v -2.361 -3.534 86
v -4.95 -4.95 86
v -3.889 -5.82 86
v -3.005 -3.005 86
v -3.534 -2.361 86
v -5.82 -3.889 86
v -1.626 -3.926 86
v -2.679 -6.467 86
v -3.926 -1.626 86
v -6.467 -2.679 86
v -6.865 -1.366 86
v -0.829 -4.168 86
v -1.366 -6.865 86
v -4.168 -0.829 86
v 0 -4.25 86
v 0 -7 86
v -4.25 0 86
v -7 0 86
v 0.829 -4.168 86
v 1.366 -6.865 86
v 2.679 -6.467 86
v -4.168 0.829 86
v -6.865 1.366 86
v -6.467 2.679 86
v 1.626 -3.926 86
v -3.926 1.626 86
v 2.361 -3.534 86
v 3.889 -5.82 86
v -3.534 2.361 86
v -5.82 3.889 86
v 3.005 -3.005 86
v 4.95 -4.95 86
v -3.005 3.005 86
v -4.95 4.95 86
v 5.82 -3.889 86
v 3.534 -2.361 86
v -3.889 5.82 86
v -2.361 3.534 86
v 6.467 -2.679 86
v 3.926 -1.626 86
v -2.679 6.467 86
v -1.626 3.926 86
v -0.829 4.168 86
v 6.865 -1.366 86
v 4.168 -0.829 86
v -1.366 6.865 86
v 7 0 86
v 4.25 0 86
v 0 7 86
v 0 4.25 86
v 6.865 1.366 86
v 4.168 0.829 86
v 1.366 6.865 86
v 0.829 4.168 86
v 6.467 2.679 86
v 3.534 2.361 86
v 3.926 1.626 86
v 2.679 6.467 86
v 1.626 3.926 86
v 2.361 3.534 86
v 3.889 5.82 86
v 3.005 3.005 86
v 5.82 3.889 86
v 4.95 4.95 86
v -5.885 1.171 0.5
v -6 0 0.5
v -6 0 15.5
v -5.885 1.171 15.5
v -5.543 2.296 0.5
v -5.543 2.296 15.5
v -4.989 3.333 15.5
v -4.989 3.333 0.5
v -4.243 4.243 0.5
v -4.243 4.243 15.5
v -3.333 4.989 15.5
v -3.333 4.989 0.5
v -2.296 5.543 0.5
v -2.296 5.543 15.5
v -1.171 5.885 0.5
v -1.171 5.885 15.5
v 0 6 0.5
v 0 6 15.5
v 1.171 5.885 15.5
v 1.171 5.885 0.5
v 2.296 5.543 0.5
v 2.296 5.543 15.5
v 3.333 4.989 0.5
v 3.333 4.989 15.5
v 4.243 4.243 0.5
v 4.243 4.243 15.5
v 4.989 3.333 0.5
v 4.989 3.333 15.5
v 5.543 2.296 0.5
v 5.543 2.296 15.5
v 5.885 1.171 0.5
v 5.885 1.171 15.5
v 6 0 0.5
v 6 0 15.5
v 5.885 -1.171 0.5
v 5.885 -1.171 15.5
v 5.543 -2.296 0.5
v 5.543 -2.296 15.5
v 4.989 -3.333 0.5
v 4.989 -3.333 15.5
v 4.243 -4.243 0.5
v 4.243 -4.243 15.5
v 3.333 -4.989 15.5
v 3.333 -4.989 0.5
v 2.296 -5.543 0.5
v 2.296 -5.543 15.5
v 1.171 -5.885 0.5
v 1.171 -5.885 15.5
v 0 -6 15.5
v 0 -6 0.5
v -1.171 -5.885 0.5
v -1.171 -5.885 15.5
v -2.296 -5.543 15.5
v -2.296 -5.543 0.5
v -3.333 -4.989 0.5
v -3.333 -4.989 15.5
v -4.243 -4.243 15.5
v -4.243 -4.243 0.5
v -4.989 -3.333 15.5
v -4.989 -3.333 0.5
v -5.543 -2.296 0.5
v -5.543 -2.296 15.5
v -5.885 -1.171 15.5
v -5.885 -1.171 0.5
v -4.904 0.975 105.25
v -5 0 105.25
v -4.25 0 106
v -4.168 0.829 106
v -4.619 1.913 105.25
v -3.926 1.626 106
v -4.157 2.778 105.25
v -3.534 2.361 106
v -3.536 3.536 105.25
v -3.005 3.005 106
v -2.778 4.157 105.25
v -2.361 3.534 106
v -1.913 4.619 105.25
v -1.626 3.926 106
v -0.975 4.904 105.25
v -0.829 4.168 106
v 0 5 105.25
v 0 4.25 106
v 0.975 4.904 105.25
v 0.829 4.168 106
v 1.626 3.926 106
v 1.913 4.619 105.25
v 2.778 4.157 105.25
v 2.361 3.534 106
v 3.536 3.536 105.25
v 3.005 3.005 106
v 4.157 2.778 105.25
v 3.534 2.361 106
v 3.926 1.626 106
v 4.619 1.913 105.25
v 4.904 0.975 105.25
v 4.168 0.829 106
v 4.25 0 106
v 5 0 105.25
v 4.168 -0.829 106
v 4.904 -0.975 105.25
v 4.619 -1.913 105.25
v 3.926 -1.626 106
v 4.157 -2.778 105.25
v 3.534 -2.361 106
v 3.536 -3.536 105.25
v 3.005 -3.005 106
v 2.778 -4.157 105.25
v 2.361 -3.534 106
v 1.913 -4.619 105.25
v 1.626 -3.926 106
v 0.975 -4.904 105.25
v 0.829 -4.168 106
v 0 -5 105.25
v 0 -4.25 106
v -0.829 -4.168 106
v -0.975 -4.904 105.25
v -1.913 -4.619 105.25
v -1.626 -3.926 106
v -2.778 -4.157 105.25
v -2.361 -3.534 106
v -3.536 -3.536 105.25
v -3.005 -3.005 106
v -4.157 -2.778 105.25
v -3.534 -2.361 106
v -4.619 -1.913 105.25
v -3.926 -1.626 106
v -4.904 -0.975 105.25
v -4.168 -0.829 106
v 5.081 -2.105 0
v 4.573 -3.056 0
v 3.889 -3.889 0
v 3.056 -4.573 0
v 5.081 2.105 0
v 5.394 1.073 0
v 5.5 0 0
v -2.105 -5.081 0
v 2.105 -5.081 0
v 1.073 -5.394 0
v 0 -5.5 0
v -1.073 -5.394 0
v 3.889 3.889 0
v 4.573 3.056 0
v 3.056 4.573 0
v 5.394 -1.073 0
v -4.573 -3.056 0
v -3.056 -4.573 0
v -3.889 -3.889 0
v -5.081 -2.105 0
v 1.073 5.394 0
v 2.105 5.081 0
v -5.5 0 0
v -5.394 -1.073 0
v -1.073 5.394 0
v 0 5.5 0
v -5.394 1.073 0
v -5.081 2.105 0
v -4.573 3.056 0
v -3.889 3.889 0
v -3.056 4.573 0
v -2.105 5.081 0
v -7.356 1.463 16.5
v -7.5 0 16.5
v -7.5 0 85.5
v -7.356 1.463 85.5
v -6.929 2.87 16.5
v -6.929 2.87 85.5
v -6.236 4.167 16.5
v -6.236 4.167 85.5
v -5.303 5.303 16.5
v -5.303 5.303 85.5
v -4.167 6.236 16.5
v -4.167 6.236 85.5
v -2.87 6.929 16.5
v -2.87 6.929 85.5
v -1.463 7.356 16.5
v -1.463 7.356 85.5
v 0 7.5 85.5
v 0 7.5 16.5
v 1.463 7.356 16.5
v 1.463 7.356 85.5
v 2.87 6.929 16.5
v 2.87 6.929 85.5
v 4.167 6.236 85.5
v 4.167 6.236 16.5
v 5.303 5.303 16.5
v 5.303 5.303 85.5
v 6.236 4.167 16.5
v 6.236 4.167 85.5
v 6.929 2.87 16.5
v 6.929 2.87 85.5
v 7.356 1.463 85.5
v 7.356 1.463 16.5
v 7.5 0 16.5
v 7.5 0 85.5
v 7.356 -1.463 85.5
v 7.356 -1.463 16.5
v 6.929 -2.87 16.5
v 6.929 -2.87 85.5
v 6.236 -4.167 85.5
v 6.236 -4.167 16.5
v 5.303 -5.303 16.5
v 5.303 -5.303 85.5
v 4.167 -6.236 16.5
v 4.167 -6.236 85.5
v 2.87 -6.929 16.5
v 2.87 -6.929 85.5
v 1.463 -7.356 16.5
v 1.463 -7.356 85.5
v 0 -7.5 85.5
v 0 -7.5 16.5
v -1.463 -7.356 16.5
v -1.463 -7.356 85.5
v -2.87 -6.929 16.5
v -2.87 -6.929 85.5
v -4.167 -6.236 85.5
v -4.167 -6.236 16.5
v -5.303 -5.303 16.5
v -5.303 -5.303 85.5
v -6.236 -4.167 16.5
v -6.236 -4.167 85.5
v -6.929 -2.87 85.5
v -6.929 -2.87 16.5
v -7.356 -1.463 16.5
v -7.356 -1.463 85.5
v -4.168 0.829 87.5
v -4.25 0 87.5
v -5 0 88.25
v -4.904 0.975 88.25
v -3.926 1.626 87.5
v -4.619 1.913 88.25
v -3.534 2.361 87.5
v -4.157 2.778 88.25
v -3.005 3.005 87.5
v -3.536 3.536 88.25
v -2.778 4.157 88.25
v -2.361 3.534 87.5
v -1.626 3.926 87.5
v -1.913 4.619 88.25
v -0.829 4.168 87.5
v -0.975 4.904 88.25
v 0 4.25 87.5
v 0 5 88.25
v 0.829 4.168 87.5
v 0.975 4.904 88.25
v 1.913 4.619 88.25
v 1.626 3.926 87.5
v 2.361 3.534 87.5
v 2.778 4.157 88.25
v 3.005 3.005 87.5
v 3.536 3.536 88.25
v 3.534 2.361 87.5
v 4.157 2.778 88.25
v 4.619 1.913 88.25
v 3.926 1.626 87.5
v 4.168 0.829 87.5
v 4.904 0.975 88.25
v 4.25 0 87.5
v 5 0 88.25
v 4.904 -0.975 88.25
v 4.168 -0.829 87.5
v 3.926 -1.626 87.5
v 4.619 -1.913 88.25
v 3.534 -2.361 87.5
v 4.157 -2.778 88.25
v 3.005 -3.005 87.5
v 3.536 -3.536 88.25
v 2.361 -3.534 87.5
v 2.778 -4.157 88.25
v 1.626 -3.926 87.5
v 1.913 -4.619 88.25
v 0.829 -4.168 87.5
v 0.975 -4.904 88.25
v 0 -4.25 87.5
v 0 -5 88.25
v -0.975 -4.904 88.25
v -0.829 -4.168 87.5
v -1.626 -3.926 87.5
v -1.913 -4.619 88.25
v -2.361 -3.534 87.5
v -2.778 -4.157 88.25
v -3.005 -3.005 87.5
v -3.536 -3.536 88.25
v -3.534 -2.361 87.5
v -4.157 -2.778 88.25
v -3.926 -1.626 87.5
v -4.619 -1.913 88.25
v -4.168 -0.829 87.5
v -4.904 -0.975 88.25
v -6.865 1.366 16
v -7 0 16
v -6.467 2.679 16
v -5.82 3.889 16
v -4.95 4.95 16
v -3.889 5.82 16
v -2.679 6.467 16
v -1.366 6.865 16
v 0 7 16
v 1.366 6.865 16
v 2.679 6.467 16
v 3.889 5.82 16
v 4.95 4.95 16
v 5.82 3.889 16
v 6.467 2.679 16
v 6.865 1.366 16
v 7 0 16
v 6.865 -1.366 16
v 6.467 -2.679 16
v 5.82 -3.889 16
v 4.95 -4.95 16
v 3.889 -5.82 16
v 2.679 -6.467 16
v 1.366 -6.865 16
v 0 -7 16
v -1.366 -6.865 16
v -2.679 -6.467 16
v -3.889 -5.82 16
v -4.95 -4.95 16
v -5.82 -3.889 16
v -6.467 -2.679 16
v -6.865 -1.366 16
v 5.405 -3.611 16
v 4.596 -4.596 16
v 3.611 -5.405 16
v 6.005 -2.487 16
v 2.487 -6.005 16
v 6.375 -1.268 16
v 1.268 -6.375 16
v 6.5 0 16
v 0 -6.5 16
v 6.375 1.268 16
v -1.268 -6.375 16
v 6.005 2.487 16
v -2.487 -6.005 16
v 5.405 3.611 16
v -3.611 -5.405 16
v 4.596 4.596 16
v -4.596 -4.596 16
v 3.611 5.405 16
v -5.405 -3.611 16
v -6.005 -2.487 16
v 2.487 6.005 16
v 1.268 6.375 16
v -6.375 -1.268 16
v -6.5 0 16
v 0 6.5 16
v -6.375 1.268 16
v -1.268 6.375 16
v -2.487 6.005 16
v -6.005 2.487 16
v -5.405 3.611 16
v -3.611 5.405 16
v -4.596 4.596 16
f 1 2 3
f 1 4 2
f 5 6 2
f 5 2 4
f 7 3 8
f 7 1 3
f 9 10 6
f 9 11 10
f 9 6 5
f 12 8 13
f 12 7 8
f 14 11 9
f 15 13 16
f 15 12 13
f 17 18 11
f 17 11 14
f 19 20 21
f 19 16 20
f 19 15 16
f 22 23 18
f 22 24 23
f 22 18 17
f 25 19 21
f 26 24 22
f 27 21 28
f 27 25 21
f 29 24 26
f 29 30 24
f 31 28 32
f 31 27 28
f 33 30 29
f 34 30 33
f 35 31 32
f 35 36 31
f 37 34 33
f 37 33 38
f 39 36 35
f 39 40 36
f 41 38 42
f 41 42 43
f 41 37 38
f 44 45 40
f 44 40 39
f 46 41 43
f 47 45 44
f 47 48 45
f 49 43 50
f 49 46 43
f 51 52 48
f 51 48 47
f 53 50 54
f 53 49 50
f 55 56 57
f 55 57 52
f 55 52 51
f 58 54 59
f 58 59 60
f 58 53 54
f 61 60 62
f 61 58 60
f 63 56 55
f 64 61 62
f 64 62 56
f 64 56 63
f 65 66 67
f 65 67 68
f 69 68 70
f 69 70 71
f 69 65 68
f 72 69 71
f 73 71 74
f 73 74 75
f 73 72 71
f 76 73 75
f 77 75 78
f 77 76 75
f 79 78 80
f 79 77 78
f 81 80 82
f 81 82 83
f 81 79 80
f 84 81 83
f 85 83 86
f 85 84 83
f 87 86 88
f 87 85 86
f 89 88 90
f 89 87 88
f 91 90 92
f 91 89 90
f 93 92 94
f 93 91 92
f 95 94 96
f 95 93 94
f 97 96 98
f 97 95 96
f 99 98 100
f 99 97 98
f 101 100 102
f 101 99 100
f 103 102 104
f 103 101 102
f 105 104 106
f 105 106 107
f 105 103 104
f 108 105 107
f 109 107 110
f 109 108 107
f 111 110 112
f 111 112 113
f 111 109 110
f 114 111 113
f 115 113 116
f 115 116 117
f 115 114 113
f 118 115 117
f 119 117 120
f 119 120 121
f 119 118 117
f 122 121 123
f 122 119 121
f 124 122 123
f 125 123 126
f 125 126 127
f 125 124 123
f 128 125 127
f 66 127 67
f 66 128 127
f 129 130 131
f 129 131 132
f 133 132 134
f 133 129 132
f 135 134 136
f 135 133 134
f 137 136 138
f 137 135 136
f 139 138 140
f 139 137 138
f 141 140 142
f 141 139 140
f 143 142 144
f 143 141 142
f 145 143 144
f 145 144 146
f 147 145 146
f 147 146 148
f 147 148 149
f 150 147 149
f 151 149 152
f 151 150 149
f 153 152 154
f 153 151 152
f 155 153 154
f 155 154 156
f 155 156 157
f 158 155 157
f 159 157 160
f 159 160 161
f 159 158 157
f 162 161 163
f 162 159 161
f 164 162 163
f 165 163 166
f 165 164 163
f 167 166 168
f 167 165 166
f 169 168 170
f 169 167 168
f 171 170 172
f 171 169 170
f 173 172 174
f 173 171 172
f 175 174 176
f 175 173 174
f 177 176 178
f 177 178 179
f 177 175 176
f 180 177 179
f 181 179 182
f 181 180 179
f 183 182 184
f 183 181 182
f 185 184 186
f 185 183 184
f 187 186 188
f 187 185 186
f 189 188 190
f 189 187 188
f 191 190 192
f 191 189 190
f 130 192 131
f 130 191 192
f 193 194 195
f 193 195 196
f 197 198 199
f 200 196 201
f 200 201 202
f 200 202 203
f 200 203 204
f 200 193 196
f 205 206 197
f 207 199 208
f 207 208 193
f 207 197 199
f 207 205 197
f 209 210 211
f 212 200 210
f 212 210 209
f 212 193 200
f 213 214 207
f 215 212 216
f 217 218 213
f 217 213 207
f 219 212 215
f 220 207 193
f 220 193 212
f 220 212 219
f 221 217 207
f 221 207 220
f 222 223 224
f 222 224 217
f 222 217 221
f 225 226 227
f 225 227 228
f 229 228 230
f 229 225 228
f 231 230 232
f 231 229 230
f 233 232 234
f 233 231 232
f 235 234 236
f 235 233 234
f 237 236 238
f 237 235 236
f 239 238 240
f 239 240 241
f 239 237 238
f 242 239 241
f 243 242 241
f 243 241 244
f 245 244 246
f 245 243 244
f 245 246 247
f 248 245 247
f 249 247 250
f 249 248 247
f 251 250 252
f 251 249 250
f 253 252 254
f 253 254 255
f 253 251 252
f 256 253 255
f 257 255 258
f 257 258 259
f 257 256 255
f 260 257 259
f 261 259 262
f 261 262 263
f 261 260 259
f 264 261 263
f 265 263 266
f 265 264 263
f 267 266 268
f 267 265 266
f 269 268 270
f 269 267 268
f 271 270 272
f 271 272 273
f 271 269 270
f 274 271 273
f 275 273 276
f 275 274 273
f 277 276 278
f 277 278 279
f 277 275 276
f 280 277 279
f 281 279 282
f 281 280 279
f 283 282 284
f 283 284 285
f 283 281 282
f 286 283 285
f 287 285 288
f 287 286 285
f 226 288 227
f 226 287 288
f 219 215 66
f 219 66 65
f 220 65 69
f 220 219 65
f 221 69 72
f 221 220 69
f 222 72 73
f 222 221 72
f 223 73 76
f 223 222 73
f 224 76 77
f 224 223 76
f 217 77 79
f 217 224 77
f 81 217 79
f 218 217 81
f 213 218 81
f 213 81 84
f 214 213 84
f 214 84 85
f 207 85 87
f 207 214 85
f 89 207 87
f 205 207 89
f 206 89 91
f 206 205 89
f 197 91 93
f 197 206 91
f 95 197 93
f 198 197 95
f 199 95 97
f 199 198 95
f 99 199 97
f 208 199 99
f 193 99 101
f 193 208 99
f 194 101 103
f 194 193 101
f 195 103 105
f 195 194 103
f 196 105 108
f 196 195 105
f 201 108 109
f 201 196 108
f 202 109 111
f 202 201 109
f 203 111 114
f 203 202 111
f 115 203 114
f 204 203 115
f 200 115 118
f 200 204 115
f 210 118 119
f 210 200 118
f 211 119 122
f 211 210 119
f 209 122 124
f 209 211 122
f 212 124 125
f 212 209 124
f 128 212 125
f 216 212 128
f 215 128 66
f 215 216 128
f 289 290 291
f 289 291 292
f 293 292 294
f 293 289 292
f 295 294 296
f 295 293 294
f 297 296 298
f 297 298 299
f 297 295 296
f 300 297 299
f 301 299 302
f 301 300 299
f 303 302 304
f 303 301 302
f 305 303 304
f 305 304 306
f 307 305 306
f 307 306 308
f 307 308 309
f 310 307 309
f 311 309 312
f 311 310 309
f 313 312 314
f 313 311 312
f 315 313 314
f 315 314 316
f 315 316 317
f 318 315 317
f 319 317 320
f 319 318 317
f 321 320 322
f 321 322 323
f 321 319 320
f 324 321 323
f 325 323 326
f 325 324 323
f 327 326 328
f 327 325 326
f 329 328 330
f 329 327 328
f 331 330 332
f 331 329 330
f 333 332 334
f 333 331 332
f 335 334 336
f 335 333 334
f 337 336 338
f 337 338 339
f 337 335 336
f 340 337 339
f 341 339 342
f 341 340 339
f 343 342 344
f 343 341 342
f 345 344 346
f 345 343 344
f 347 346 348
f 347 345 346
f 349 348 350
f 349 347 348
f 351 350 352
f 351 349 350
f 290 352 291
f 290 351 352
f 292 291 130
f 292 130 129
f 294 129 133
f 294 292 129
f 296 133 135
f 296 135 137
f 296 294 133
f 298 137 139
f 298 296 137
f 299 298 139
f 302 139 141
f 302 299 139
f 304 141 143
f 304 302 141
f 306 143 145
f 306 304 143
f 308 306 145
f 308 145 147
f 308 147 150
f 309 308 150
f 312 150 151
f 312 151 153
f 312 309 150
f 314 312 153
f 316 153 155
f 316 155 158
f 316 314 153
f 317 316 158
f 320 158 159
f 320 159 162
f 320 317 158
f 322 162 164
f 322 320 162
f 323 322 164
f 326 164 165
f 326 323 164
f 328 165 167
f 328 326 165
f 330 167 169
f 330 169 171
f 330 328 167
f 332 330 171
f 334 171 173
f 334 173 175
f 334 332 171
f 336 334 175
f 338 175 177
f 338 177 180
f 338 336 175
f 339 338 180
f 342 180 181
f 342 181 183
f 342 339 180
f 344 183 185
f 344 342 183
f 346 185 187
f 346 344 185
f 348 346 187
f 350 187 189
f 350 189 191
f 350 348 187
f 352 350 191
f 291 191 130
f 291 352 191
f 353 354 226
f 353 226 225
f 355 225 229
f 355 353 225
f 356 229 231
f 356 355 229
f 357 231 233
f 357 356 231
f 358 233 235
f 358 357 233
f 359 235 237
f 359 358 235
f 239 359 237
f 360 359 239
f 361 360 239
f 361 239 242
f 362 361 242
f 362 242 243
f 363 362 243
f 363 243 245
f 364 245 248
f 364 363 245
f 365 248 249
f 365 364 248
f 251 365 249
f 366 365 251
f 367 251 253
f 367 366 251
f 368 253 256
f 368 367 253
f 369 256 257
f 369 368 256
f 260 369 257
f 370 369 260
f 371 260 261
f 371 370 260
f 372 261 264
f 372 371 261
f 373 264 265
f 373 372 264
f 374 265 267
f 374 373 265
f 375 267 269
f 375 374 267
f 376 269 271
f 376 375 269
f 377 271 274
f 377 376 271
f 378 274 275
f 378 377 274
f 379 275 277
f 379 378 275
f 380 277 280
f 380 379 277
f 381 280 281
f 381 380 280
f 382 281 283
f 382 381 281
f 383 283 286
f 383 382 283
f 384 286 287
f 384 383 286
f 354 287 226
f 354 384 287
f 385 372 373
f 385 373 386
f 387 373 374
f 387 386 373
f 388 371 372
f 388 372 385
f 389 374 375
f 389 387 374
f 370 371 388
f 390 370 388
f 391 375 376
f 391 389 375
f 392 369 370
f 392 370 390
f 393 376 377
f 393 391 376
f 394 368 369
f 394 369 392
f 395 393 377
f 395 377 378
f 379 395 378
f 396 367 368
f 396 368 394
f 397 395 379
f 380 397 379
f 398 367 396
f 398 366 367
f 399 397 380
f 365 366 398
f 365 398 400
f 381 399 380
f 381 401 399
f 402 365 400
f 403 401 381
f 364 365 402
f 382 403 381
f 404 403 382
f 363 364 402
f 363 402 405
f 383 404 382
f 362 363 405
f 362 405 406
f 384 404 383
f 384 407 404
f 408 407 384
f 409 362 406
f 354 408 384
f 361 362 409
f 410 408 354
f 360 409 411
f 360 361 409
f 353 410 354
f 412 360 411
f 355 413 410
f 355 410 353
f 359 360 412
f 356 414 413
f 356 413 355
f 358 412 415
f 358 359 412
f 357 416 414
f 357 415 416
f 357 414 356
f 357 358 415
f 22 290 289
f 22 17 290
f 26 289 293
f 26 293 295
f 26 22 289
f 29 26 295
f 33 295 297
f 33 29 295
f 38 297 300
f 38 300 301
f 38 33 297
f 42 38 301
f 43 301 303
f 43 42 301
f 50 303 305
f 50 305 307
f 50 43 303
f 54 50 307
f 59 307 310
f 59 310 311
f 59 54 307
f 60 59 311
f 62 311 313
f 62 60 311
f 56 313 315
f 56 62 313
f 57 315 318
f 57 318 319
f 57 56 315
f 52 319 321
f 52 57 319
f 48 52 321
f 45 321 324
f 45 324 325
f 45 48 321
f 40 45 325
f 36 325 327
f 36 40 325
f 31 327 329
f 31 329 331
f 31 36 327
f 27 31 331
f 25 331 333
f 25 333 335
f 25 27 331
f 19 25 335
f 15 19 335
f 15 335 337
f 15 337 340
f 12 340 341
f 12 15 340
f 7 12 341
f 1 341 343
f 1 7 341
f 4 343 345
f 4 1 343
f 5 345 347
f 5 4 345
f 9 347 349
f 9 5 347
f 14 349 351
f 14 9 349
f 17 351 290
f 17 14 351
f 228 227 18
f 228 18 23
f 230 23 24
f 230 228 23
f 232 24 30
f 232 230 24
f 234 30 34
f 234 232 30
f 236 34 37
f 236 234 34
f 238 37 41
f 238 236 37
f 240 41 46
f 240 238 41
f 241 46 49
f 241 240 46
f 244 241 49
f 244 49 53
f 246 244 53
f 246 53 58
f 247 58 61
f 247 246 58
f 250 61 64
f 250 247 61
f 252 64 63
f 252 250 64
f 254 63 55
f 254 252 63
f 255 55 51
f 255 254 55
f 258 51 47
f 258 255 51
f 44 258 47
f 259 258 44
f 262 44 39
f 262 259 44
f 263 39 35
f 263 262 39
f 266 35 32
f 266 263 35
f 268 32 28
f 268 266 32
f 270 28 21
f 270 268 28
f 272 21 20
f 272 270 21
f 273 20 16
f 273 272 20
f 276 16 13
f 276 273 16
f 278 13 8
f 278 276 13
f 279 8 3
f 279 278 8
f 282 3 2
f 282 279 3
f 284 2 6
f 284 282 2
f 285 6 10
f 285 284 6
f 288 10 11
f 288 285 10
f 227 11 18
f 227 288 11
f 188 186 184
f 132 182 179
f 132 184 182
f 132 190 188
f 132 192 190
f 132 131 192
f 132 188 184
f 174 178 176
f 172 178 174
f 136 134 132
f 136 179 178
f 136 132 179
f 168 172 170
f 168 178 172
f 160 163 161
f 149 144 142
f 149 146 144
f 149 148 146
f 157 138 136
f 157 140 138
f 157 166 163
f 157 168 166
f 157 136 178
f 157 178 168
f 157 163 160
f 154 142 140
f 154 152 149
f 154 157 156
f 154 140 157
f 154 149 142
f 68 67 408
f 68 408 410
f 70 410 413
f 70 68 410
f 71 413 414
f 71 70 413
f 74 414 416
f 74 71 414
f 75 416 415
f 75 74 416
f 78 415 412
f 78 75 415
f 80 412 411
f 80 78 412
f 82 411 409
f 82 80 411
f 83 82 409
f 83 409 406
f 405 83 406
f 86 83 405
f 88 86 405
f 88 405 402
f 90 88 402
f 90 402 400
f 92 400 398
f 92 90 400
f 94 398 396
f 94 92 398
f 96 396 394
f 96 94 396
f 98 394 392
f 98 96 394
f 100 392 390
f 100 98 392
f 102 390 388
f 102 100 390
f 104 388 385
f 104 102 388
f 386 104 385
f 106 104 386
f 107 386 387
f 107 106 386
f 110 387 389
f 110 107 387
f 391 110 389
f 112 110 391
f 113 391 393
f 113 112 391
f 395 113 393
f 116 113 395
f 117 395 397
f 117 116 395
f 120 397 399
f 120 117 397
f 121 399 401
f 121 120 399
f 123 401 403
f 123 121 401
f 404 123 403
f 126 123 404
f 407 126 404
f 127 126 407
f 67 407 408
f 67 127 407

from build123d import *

# Parameters (mm, degrees)
F2_SIZE = 0.74999
F3_SIZE = 0.5


# Not quite as in the source:
# - a fillet or chamfer is up to 0.001 mm smaller than in the source, because OpenCascade refuses the exact size


with BuildPart() as f1:
    # F0 (on Front) → F1 (revolve)
    with BuildSketch(Plane.XZ):
        Polygon((-6, 0), (0, 0), (0, 106), (-5, 106), (-5, 87.5), (-4.25, 87.5), (-4.25, 86), (-5, 86), (-7.5, 86), (-7.5, 16), (-6, 16), (-6, 14.25), align=None)
    revolve(axis=Axis((0, 0, 53), (0, 0, -1)))

    # F2 (size 0.75 in the source; OpenCascade refuses exactly that, so slightly less here)
    f2_edges = [f1.edges().sort_by_distance(p)[0] for p in [
        (5, 0, 106),
        (5, 0, 87.5),
        (-5, 0, 96.75),
    ]]
    chamfer(f2_edges, length=F2_SIZE)

    # F3
    f3_edges = [f1.edges().sort_by_distance(p)[0] for p in [
        (7.5, 0, 86),
        (7.5, 0, 16),
        (-7.5, 0, 51),
        (6, 0, 0),
        (6, 0, 16),
    ]]
    chamfer(f3_edges, length=F3_SIZE)


solid = f1.part
